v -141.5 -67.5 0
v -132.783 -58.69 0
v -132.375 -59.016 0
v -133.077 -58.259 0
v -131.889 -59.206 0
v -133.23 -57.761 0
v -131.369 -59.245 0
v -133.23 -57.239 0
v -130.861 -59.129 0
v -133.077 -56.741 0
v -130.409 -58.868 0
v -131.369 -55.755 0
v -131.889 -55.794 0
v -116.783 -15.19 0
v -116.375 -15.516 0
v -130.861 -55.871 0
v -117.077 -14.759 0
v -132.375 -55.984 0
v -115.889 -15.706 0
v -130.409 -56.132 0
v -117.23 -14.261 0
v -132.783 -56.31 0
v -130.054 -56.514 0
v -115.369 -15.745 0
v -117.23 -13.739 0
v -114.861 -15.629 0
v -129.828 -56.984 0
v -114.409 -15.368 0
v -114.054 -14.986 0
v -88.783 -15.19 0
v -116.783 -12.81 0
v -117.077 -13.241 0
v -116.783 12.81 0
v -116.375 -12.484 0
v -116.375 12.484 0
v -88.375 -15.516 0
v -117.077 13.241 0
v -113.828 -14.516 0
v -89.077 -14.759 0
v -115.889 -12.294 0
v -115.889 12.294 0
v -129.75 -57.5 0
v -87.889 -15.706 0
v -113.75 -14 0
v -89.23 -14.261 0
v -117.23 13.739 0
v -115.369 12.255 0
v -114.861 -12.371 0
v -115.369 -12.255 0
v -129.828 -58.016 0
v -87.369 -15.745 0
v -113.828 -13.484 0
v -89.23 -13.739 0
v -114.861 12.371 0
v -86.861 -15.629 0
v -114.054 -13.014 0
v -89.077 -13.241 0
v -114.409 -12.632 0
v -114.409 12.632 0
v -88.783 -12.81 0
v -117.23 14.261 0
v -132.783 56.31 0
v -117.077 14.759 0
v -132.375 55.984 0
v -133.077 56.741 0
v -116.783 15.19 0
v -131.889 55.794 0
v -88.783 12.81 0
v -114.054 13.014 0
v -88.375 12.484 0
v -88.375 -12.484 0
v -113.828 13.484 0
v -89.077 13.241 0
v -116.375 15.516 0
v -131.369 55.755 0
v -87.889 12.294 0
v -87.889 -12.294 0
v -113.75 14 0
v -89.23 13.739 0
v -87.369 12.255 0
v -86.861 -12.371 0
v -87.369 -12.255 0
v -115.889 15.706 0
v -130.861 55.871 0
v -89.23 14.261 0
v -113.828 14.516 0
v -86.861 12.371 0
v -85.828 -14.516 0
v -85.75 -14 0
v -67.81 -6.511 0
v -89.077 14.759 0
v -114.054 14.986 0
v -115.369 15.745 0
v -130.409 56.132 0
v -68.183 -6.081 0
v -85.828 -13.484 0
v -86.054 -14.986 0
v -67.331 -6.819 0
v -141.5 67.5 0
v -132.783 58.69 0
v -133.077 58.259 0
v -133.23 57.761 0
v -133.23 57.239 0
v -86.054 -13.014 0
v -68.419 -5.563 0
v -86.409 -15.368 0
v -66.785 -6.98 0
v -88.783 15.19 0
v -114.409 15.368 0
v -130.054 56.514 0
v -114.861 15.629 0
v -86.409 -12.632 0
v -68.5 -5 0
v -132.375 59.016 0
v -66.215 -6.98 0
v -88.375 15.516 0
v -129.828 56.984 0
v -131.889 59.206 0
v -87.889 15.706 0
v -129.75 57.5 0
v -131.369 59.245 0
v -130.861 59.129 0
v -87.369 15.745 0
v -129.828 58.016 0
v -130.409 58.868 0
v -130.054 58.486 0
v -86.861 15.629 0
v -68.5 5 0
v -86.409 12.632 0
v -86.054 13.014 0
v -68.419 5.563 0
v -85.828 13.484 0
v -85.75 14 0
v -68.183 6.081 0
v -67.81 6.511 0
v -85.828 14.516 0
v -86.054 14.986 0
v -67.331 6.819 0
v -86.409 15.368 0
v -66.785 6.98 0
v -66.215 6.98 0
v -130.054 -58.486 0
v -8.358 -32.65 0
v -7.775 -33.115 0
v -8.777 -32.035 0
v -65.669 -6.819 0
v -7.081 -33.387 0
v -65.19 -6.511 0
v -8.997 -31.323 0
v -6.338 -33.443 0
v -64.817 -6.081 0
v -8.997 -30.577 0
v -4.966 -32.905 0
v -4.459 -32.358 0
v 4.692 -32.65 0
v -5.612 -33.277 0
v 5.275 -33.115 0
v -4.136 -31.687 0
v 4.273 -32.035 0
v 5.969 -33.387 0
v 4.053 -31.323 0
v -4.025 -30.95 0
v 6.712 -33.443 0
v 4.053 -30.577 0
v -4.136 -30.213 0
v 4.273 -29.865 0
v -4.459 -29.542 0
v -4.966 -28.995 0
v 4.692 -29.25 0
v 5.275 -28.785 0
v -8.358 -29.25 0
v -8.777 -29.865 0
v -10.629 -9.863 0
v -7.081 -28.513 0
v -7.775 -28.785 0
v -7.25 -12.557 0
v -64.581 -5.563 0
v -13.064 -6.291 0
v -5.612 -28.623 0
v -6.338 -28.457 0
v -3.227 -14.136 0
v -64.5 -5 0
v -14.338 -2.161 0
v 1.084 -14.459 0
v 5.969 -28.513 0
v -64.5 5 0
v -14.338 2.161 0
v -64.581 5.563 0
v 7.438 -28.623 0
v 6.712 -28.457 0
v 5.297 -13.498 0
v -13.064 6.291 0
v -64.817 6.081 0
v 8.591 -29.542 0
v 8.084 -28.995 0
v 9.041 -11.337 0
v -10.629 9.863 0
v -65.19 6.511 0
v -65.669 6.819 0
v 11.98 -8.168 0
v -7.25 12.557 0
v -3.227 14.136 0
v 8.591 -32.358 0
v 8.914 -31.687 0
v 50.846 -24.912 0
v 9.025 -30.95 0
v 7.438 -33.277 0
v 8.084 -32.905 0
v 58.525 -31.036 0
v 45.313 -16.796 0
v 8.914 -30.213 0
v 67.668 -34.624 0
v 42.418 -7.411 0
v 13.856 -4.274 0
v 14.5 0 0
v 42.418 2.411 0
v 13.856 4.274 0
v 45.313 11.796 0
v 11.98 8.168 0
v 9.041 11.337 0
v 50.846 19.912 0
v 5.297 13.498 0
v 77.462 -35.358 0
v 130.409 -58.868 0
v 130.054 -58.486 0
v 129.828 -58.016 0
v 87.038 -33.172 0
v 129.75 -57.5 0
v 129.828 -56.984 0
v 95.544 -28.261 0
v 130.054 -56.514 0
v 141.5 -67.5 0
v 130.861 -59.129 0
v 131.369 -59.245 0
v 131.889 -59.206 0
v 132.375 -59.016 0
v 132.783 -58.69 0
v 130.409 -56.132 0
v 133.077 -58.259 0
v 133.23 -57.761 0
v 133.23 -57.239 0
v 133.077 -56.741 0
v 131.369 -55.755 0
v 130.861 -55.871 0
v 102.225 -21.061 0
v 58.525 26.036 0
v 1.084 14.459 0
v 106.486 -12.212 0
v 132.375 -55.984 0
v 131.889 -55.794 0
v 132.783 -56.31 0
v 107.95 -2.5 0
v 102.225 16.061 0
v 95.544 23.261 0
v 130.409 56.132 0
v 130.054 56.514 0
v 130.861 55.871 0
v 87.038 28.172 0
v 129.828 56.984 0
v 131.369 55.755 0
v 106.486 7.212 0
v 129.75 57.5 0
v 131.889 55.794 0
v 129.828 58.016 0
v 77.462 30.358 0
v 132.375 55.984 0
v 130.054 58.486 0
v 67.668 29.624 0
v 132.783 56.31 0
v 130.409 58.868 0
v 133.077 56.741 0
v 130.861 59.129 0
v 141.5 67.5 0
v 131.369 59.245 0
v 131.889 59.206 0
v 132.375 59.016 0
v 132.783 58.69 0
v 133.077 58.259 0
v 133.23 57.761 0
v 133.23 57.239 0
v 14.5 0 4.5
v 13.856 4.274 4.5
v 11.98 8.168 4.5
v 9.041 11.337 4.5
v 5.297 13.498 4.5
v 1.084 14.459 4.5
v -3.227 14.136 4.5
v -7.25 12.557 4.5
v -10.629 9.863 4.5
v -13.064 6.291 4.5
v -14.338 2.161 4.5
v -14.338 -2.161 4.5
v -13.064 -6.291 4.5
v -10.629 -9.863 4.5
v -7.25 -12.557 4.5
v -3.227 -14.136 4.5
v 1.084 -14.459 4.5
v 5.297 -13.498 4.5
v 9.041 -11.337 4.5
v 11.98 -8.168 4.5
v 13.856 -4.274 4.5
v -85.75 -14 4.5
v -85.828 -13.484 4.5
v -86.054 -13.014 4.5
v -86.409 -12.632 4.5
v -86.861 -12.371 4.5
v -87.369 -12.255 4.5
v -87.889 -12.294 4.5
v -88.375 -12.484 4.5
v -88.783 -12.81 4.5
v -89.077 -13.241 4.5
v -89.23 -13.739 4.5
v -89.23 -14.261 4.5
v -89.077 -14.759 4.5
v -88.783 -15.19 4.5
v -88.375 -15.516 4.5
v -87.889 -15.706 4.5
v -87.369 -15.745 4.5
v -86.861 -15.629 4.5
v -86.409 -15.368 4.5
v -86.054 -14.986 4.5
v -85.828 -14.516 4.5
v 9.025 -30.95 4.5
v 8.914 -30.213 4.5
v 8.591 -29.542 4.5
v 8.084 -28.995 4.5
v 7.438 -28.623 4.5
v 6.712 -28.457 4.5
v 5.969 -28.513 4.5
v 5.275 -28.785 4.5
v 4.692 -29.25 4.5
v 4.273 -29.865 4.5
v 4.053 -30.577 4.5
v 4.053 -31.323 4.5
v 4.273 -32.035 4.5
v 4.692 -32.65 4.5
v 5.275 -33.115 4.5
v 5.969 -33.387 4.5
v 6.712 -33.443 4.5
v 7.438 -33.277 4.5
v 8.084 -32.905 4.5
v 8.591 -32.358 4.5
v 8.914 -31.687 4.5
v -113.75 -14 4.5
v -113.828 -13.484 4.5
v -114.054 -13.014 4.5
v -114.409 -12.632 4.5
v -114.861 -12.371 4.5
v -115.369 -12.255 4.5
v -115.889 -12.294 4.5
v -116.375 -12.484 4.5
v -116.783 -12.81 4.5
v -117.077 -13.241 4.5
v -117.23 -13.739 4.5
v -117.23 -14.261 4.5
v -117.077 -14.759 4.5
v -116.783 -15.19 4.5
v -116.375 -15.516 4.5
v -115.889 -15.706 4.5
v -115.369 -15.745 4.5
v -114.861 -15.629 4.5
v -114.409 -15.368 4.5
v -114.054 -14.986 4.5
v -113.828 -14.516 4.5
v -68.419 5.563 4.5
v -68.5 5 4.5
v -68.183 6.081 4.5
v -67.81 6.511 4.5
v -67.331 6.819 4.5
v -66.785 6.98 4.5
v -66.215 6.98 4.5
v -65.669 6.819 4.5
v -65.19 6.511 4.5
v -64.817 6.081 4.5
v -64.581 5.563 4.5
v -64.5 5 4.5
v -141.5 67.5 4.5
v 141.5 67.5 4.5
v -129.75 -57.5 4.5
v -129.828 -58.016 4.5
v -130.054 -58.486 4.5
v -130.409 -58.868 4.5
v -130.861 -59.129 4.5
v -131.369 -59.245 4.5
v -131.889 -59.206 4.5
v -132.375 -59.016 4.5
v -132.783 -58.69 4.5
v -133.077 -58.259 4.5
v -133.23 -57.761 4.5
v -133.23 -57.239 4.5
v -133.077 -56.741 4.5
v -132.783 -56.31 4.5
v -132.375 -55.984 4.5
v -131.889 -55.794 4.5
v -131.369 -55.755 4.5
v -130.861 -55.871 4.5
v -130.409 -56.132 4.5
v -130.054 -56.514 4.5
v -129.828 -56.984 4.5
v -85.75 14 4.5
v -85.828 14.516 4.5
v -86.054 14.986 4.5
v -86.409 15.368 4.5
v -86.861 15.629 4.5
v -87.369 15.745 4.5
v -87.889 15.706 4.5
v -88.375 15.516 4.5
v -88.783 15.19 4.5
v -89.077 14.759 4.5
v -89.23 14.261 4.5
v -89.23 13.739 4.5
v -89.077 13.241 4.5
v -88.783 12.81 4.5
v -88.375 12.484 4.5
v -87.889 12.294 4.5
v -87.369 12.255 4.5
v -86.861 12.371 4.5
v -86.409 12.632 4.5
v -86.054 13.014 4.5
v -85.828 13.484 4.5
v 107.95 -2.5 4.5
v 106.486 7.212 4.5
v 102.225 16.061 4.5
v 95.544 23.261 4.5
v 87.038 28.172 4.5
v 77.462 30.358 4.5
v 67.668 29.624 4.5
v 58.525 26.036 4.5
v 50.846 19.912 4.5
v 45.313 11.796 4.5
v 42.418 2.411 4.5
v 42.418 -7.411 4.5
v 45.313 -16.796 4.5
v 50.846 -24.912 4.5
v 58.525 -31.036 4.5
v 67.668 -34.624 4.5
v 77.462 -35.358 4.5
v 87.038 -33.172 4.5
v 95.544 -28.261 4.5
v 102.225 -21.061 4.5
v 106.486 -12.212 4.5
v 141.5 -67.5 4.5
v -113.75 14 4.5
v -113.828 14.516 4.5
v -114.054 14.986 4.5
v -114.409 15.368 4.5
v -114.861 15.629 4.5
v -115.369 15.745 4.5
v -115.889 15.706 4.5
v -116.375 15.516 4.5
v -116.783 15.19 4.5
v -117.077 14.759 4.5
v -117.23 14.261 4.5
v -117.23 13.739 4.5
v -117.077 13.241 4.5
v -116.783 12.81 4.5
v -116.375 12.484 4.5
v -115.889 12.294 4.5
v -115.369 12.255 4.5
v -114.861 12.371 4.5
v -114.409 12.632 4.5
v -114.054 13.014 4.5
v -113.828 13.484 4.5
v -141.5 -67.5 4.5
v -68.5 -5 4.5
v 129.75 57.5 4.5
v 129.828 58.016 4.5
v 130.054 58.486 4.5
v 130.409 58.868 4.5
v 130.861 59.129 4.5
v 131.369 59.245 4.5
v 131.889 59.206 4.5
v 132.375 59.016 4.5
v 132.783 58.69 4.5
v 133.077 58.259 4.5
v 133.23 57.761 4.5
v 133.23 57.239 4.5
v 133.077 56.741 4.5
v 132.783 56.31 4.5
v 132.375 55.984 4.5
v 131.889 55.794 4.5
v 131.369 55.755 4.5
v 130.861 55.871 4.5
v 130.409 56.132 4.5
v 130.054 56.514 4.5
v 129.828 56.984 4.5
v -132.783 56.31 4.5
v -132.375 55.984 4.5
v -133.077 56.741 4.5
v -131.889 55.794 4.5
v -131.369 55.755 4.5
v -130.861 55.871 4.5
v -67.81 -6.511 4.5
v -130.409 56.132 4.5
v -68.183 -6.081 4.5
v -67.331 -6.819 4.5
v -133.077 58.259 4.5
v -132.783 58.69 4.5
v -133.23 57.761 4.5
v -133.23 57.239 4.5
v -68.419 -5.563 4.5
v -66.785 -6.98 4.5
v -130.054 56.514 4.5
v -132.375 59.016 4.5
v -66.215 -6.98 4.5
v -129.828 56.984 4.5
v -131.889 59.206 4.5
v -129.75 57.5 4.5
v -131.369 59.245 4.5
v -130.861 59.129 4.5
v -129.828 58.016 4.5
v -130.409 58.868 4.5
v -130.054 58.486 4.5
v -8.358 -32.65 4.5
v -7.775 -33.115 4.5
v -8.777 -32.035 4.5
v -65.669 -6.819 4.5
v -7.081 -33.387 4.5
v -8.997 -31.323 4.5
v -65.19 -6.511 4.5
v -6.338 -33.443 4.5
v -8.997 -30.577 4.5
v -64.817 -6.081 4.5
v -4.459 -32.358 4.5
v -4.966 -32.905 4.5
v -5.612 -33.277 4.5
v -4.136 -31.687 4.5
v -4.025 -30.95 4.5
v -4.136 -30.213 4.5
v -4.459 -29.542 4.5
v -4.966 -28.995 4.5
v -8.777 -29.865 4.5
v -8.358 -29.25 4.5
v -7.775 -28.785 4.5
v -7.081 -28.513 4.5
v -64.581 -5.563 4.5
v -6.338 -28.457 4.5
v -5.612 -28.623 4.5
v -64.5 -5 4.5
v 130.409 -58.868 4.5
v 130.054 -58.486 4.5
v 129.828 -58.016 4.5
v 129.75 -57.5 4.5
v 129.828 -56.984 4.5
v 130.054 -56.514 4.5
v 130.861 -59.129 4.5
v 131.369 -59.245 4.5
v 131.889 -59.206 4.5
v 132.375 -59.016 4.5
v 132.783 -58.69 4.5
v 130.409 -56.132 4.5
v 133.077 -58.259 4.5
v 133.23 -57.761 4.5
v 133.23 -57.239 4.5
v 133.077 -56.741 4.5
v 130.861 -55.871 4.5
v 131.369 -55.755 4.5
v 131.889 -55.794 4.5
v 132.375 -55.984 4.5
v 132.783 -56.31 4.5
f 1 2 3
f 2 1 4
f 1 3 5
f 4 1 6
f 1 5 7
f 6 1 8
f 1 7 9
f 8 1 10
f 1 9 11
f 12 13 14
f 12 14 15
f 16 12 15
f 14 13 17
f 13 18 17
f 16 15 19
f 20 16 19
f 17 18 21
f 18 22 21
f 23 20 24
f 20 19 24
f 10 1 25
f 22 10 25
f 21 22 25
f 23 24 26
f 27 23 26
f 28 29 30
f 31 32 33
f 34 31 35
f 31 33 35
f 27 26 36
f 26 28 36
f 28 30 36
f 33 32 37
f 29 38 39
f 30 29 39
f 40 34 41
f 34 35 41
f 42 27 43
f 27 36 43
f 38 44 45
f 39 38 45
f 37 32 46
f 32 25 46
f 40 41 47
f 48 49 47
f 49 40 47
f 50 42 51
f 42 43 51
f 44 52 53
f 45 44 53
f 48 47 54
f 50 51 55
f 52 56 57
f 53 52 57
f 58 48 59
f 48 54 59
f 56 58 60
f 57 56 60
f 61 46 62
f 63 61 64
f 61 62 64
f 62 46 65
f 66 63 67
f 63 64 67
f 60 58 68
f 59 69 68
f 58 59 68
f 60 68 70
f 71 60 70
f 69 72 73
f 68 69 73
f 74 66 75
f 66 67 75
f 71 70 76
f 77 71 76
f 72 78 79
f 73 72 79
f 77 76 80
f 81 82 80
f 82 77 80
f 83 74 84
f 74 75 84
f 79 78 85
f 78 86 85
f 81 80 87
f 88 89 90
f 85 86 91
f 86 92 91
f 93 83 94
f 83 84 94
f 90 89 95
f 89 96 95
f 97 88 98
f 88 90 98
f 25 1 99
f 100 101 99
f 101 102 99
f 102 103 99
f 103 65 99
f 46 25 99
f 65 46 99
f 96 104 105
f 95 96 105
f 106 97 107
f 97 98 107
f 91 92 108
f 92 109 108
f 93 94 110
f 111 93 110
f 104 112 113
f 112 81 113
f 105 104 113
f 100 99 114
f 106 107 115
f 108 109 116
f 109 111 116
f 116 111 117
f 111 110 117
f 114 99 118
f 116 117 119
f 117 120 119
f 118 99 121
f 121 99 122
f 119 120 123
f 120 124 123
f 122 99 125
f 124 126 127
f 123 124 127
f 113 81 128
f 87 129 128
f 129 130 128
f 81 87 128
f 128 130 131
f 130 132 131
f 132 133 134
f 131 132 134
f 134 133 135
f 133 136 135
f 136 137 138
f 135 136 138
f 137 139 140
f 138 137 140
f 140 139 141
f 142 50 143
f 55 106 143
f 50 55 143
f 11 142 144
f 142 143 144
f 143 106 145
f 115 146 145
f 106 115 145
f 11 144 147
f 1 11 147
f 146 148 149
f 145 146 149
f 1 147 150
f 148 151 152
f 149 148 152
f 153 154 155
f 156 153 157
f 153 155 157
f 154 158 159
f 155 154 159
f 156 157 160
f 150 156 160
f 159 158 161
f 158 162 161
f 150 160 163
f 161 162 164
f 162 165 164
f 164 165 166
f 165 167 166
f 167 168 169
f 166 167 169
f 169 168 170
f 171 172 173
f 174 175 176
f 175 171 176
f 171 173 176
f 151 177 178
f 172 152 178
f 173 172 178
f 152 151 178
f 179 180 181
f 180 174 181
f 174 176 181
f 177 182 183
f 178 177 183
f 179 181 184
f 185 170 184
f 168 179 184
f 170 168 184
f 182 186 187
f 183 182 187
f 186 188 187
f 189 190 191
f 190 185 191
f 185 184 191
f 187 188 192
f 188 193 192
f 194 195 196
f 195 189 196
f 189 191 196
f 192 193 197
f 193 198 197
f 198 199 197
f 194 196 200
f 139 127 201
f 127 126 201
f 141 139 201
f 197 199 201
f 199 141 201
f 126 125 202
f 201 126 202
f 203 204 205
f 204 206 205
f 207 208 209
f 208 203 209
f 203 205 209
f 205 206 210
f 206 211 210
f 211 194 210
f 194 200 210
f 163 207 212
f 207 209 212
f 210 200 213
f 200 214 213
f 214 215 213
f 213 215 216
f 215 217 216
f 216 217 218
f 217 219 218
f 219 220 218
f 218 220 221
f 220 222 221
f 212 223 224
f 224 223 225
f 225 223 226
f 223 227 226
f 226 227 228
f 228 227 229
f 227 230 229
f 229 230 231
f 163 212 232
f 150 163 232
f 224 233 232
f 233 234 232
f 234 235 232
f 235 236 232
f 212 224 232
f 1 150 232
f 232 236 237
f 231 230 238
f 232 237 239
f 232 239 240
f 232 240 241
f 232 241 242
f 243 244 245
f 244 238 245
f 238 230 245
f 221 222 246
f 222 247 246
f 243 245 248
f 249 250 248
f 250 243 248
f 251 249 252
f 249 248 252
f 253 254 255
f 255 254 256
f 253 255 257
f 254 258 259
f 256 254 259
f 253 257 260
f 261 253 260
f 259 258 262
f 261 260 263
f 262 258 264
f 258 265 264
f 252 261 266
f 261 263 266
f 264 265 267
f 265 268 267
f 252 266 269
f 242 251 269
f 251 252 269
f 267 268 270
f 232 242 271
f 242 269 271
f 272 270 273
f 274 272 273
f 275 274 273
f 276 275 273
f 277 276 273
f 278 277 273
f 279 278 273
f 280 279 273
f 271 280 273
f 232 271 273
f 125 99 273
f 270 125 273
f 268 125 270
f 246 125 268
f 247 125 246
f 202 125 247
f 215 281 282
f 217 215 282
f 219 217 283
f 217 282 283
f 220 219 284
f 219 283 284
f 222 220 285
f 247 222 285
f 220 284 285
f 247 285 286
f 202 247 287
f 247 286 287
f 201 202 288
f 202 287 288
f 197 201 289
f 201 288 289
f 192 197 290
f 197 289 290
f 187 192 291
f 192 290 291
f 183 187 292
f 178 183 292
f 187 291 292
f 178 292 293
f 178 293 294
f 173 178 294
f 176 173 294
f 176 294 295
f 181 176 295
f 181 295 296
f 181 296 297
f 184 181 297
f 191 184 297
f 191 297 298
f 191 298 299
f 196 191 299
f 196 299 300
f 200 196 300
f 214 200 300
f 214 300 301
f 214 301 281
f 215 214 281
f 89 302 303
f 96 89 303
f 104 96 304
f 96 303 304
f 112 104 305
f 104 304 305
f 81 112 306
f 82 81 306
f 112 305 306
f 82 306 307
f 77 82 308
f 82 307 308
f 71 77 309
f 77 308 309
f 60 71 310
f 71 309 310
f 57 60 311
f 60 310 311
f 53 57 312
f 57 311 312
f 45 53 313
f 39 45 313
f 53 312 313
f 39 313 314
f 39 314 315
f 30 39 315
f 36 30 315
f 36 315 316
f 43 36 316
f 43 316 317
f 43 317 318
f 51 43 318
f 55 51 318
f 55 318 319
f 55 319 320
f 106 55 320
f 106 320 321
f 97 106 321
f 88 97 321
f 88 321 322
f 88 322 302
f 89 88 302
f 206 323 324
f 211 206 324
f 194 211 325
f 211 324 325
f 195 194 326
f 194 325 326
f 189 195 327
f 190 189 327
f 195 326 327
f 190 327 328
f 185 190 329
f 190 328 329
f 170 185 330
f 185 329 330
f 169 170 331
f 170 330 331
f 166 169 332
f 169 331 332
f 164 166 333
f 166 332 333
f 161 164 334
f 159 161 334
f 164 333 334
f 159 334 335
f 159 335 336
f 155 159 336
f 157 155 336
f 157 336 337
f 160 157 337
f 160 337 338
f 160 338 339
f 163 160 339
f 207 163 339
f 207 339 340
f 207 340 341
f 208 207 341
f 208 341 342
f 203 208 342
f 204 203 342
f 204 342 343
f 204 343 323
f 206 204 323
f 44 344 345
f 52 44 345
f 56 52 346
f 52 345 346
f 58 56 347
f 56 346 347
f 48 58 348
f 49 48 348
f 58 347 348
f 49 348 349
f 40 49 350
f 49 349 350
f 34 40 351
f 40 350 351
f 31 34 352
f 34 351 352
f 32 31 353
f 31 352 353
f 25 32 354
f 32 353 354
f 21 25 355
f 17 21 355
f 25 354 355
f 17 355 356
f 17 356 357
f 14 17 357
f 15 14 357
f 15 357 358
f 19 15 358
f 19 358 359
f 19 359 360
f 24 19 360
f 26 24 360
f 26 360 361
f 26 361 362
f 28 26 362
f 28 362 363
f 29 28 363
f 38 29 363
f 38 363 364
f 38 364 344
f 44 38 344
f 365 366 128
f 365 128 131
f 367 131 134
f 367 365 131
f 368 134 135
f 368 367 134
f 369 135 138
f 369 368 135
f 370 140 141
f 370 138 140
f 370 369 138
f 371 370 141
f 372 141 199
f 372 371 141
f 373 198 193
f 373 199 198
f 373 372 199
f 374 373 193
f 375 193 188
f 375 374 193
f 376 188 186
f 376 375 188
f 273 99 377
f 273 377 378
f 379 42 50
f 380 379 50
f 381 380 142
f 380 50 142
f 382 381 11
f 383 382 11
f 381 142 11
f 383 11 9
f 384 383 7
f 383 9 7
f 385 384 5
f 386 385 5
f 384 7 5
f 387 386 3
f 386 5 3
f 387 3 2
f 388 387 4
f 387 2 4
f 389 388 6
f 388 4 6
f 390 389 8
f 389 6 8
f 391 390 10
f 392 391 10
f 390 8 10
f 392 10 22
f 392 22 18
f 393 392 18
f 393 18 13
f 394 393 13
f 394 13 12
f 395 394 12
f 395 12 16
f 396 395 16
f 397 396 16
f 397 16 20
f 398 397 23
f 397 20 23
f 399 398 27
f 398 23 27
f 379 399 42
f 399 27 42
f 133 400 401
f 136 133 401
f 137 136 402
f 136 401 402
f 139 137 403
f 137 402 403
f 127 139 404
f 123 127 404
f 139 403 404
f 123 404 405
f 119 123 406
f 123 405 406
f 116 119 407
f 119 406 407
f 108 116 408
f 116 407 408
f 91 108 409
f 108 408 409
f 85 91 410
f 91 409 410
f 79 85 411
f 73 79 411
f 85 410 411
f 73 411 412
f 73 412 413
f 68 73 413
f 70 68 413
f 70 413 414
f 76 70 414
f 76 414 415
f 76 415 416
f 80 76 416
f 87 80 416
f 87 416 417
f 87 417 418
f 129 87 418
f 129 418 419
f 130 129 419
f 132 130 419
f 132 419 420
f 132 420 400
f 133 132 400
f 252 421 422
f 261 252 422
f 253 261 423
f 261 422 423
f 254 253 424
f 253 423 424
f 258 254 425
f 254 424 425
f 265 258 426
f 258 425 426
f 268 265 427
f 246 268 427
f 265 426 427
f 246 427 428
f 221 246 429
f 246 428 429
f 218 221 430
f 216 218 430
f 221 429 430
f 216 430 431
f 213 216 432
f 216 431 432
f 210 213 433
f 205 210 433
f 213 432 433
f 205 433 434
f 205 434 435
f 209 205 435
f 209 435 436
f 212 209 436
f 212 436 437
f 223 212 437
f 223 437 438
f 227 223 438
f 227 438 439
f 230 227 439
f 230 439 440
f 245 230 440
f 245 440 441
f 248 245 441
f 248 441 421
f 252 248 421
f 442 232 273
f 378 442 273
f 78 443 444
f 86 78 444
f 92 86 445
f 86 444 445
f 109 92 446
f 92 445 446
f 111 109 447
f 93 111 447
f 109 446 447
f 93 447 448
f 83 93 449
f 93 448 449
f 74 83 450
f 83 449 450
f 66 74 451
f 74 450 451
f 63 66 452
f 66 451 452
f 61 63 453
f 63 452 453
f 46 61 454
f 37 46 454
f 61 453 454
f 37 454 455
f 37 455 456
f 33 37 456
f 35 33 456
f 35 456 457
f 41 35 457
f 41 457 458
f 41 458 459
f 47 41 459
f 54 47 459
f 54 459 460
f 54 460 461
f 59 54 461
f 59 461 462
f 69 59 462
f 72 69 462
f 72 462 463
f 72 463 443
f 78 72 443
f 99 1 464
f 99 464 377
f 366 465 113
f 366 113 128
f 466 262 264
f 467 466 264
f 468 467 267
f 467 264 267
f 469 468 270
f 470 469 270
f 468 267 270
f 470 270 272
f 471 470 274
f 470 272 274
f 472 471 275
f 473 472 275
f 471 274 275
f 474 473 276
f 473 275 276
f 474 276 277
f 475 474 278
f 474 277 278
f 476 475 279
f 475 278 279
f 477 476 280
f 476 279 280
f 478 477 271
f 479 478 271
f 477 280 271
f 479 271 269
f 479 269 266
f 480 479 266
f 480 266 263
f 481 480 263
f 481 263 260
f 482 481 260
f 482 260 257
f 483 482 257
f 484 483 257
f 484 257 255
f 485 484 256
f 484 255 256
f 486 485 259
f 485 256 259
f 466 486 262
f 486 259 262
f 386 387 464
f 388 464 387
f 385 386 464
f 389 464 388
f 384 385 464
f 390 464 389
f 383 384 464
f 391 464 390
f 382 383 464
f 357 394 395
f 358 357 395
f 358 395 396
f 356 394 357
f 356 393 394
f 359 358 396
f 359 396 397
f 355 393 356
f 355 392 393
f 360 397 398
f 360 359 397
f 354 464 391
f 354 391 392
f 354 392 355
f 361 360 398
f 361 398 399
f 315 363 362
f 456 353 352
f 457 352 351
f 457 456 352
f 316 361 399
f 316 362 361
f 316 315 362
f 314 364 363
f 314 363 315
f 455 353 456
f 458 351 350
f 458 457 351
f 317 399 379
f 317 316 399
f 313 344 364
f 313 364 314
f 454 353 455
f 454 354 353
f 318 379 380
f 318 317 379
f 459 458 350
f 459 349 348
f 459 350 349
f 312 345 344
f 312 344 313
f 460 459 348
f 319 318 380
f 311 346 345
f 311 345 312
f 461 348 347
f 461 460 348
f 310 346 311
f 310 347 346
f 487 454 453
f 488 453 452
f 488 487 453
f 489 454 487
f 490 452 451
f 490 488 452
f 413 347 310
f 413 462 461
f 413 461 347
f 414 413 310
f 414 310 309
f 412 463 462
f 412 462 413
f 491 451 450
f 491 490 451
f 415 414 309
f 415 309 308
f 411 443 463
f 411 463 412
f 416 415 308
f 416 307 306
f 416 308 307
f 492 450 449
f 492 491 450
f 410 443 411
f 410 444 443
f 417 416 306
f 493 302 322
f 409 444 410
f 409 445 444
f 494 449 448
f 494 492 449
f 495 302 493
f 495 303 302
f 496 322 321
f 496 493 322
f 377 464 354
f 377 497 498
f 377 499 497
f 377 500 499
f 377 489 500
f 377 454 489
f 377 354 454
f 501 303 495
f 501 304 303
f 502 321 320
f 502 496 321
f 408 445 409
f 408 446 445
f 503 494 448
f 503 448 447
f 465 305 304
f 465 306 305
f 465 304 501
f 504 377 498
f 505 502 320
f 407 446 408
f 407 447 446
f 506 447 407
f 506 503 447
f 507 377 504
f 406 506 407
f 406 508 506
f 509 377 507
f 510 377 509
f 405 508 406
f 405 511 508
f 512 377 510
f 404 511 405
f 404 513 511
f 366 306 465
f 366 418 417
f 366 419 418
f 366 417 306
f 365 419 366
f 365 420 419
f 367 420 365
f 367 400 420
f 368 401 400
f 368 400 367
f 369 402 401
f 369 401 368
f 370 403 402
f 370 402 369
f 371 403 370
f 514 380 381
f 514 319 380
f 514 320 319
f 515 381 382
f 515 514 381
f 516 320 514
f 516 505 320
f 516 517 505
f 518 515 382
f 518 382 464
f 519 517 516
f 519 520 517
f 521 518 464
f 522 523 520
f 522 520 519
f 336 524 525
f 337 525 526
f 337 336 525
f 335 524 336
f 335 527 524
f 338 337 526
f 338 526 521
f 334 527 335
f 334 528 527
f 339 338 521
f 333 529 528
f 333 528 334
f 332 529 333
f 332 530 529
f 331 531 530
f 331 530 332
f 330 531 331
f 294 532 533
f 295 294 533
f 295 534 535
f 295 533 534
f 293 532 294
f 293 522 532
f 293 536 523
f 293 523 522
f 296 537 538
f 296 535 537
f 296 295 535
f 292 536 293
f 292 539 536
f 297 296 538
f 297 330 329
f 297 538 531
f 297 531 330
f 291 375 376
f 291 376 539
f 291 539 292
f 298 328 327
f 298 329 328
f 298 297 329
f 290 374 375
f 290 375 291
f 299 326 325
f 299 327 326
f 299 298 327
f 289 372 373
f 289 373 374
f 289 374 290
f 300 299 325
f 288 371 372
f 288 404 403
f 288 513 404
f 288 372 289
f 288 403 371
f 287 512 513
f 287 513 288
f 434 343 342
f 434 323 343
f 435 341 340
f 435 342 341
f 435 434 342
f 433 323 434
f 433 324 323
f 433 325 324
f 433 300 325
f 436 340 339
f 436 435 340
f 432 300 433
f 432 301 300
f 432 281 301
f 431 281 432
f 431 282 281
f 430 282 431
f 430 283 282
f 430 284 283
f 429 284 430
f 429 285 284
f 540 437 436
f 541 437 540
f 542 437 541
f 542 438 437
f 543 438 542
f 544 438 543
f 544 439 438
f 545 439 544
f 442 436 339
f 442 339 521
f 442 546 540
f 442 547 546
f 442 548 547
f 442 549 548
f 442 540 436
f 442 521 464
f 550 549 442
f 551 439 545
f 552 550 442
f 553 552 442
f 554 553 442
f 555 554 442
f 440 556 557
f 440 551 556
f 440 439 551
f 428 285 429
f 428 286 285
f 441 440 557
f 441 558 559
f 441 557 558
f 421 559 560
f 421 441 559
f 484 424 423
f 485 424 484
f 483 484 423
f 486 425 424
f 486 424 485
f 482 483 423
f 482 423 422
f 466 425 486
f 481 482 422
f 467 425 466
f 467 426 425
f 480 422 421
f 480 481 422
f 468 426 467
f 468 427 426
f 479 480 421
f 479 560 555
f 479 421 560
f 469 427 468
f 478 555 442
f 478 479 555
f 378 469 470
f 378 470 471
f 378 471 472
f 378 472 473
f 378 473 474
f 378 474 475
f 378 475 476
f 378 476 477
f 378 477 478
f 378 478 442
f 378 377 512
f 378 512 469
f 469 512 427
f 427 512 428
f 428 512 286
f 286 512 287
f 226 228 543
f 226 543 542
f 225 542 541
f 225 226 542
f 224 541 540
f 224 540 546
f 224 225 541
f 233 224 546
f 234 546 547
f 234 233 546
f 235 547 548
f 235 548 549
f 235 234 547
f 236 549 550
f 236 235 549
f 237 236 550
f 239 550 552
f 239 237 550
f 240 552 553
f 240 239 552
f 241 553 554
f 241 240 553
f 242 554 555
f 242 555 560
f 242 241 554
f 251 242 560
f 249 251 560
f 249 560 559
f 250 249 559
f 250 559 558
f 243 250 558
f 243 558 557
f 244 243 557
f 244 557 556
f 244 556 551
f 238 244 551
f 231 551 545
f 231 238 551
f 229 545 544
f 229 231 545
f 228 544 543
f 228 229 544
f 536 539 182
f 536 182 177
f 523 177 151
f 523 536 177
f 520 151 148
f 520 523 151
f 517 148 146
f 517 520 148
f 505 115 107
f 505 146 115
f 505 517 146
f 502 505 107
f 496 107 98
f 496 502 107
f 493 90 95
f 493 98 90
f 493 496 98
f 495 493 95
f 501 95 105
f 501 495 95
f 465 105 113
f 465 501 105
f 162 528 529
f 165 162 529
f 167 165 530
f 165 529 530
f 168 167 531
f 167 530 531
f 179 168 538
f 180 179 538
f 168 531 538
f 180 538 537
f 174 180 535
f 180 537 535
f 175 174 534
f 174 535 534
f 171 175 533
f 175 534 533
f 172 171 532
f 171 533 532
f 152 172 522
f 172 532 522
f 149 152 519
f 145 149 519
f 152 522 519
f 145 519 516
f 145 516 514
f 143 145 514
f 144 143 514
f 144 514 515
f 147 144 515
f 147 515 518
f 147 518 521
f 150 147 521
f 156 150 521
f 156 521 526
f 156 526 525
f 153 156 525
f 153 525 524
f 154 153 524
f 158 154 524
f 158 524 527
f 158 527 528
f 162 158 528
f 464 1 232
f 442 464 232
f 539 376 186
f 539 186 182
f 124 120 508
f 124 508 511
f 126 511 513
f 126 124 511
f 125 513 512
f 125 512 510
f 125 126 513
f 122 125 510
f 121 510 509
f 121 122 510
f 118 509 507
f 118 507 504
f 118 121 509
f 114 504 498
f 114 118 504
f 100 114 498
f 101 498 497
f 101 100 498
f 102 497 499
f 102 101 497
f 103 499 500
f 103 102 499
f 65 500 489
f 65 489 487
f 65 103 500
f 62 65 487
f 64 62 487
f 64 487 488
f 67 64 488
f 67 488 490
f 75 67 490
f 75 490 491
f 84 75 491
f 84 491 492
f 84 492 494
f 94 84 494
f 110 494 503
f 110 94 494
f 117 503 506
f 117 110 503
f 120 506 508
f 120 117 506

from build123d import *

# Parameters (mm, degrees)
SKETCH1_W               = 283
SKETCH1_H               = 135
BOSS_EXTRUDE1_DEPTH     = 4.5
CUT_EXTRUDE1_REACH      = 158.84
SKETCH1_3_R             = 1.75
MIRROR3_COPY_1_REACH    = 158.84
MIRROR3_COPY_1_SKETCH_R = 1.75
MIRROR3_COPY_2_REACH    = 158.84
MIRROR3_COPY_2_SKETCH_R = 1.75
CUT_EXTRUDE2_REACH      = 158.84
SKETCH2_R               = 1.75
CUT_EXTRUDE3_REACH      = 158.84
SKETCH3_R               = 32.95
SKETCH3_R_2             = 14.5
SKETCH3_R_3             = 2.5


with BuildPart() as part:
    # Sketch1 → Boss-Extrude1 (new body)
    with BuildSketch(Plane.XY):
        Rectangle(SKETCH1_W, SKETCH1_H)
    extrude(amount=BOSS_EXTRUDE1_DEPTH)

    # Sketch1<3> → Cut-Extrude1 (cut, up to next)
    with BuildSketch(Plane.XY, mode=Mode.PRIVATE) as cut_extrude1_sk1:
        with Locations((-131.5, 57.5)):
            Circle(SKETCH1_3_R)
    cut_extrude1_tool1 = extrude(cut_extrude1_sk1.sketch, amount=CUT_EXTRUDE1_REACH, mode=Mode.PRIVATE) & part.part
    cut_extrude1 = cut_extrude1_tool1.solids().sort_by_distance((-131.5, 57.5, 0))[0]
    add(cut_extrude1, mode=Mode.SUBTRACT)

    # Mirror2: Cut-Extrude1 across plane
    add(cut_extrude1.mirror(Plane.ZX), mode=Mode.SUBTRACT)

    # Mirror3 copy 1 sketch → Mirror3 copy 1 (cut, up to next)
    with BuildSketch(Plane(origin=(0, 0, 0), x_dir=(-1, 0, 0), z_dir=(0, 0, 1)), mode=Mode.PRIVATE) as mirror3_copy_1_sk1:
        with Locations((-131.5, 57.5)):
            Circle(MIRROR3_COPY_1_SKETCH_R)
    mirror3_copy_1_tool1 = extrude(mirror3_copy_1_sk1.sketch, amount=MIRROR3_COPY_1_REACH, mode=Mode.PRIVATE) & part.part
    add(mirror3_copy_1_tool1.solids().sort_by_distance((131.5, -57.5, 0))[0], mode=Mode.SUBTRACT)

    # Mirror3 copy 2 sketch → Mirror3 copy 2 (cut, up to next)
    with BuildSketch(Plane(origin=(0, 0, 0), x_dir=(-1, 0, 0), z_dir=(0, 0, 1)), mode=Mode.PRIVATE) as mirror3_copy_2_sk1:
        with Locations((-131.5, -57.5)):
            Circle(MIRROR3_COPY_2_SKETCH_R)
    mirror3_copy_2_tool1 = extrude(mirror3_copy_2_sk1.sketch, amount=MIRROR3_COPY_2_REACH, mode=Mode.PRIVATE) & part.part
    add(mirror3_copy_2_tool1.solids().sort_by_distance((131.5, 57.5, 0))[0], mode=Mode.SUBTRACT)

    # Sketch2 → Cut-Extrude2 (cut, up to next)
    with BuildSketch(Plane.XY.offset(4.5), mode=Mode.PRIVATE) as cut_extrude2_sk1:
        with Locations((-87.5, -14)):
            Circle(SKETCH2_R)
    cut_extrude2_tool1 = extrude(cut_extrude2_sk1.sketch, amount=-CUT_EXTRUDE2_REACH, mode=Mode.PRIVATE) & part.part
    # Sketch2 → Cut-Extrude2 (cut, up to next)
    with BuildSketch(Plane.XY.offset(4.5), mode=Mode.PRIVATE) as cut_extrude2_sk2:
        with Locations((-115.5, -14)):
            Circle(SKETCH2_R)
    cut_extrude2_tool2 = extrude(cut_extrude2_sk2.sketch, amount=-CUT_EXTRUDE2_REACH, mode=Mode.PRIVATE) & part.part
    # Sketch2 → Cut-Extrude2 (cut, up to next)
    with BuildSketch(Plane.XY.offset(4.5), mode=Mode.PRIVATE) as cut_extrude2_sk3:
        with Locations((-115.5, 14)):
            Circle(SKETCH2_R)
    cut_extrude2_tool3 = extrude(cut_extrude2_sk3.sketch, amount=-CUT_EXTRUDE2_REACH, mode=Mode.PRIVATE) & part.part
    # Sketch2 → Cut-Extrude2 (cut, up to next)
    with BuildSketch(Plane.XY.offset(4.5), mode=Mode.PRIVATE) as cut_extrude2_sk4:
        with Locations((-87.5, 14)):
            Circle(SKETCH2_R)
    cut_extrude2_tool4 = extrude(cut_extrude2_sk4.sketch, amount=-CUT_EXTRUDE2_REACH, mode=Mode.PRIVATE) & part.part
    # Sketch2 → Cut-Extrude2 (cut, up to next)
    with BuildSketch(Plane.XY.offset(4.5), mode=Mode.PRIVATE) as cut_extrude2_sk5:
        with BuildLine():
            Line((-68.5, -5), (-68.5, 5))
            ThreePointArc((-68.5, 5), (-66.5, 7), (-64.5, 5))
            Line((-64.5, 5), (-64.5, -5))
            ThreePointArc((-64.5, -5), (-66.5, -7), (-68.5, -5))
        make_face()
    cut_extrude2_tool5 = extrude(cut_extrude2_sk5.sketch, amount=-CUT_EXTRUDE2_REACH, mode=Mode.PRIVATE) & part.part
    add(cut_extrude2_tool1.solids().sort_by_distance((-87.5, -14, 4.5))[0], mode=Mode.SUBTRACT)
    add(cut_extrude2_tool2.solids().sort_by_distance((-115.5, -14, 4.5))[0], mode=Mode.SUBTRACT)
    add(cut_extrude2_tool3.solids().sort_by_distance((-115.5, 14, 4.5))[0], mode=Mode.SUBTRACT)
    add(cut_extrude2_tool4.solids().sort_by_distance((-87.5, 14, 4.5))[0], mode=Mode.SUBTRACT)
    add(cut_extrude2_tool5.solids().sort_by_distance((-66.5, 0, 4.5))[0], mode=Mode.SUBTRACT)

    # Sketch3 → Cut-Extrude3 (cut, up to next)
    with BuildSketch(Plane.XY.offset(4.5), mode=Mode.PRIVATE) as cut_extrude3_sk1:
        with Locations((75, -2.5)):
            Circle(SKETCH3_R)
    cut_extrude3_tool1 = extrude(cut_extrude3_sk1.sketch, amount=-CUT_EXTRUDE3_REACH, mode=Mode.PRIVATE) & part.part
    # Sketch3 → Cut-Extrude3 (cut, up to next)
    with BuildSketch(Plane.XY.offset(4.5), mode=Mode.PRIVATE) as cut_extrude3_sk2:
        Circle(SKETCH3_R_2)
    cut_extrude3_tool2 = extrude(cut_extrude3_sk2.sketch, amount=-CUT_EXTRUDE3_REACH, mode=Mode.PRIVATE) & part.part
    # Sketch3 → Cut-Extrude3 (cut, up to next)
    with BuildSketch(Plane.XY.offset(4.5), mode=Mode.PRIVATE) as cut_extrude3_sk3:
        with Locations((-6.525, -30.95)):
            Circle(SKETCH3_R_3)
    cut_extrude3_tool3 = extrude(cut_extrude3_sk3.sketch, amount=-CUT_EXTRUDE3_REACH, mode=Mode.PRIVATE) & part.part
    # Sketch3 → Cut-Extrude3 (cut, up to next)
    with BuildSketch(Plane.XY.offset(4.5), mode=Mode.PRIVATE) as cut_extrude3_sk4:
        with Locations((6.525, -30.95)):
            Circle(SKETCH3_R_3)
    cut_extrude3_tool4 = extrude(cut_extrude3_sk4.sketch, amount=-CUT_EXTRUDE3_REACH, mode=Mode.PRIVATE) & part.part
    add(cut_extrude3_tool1.solids().sort_by_distance((75, -2.5, 4.5))[0], mode=Mode.SUBTRACT)
    add(cut_extrude3_tool2.solids().sort_by_distance((0, 0, 4.5))[0], mode=Mode.SUBTRACT)
    add(cut_extrude3_tool3.solids().sort_by_distance((-6.525, -30.95, 4.5))[0], mode=Mode.SUBTRACT)
    add(cut_extrude3_tool4.solids().sort_by_distance((6.525, -30.95, 4.5))[0], mode=Mode.SUBTRACT)


solid = part.part
